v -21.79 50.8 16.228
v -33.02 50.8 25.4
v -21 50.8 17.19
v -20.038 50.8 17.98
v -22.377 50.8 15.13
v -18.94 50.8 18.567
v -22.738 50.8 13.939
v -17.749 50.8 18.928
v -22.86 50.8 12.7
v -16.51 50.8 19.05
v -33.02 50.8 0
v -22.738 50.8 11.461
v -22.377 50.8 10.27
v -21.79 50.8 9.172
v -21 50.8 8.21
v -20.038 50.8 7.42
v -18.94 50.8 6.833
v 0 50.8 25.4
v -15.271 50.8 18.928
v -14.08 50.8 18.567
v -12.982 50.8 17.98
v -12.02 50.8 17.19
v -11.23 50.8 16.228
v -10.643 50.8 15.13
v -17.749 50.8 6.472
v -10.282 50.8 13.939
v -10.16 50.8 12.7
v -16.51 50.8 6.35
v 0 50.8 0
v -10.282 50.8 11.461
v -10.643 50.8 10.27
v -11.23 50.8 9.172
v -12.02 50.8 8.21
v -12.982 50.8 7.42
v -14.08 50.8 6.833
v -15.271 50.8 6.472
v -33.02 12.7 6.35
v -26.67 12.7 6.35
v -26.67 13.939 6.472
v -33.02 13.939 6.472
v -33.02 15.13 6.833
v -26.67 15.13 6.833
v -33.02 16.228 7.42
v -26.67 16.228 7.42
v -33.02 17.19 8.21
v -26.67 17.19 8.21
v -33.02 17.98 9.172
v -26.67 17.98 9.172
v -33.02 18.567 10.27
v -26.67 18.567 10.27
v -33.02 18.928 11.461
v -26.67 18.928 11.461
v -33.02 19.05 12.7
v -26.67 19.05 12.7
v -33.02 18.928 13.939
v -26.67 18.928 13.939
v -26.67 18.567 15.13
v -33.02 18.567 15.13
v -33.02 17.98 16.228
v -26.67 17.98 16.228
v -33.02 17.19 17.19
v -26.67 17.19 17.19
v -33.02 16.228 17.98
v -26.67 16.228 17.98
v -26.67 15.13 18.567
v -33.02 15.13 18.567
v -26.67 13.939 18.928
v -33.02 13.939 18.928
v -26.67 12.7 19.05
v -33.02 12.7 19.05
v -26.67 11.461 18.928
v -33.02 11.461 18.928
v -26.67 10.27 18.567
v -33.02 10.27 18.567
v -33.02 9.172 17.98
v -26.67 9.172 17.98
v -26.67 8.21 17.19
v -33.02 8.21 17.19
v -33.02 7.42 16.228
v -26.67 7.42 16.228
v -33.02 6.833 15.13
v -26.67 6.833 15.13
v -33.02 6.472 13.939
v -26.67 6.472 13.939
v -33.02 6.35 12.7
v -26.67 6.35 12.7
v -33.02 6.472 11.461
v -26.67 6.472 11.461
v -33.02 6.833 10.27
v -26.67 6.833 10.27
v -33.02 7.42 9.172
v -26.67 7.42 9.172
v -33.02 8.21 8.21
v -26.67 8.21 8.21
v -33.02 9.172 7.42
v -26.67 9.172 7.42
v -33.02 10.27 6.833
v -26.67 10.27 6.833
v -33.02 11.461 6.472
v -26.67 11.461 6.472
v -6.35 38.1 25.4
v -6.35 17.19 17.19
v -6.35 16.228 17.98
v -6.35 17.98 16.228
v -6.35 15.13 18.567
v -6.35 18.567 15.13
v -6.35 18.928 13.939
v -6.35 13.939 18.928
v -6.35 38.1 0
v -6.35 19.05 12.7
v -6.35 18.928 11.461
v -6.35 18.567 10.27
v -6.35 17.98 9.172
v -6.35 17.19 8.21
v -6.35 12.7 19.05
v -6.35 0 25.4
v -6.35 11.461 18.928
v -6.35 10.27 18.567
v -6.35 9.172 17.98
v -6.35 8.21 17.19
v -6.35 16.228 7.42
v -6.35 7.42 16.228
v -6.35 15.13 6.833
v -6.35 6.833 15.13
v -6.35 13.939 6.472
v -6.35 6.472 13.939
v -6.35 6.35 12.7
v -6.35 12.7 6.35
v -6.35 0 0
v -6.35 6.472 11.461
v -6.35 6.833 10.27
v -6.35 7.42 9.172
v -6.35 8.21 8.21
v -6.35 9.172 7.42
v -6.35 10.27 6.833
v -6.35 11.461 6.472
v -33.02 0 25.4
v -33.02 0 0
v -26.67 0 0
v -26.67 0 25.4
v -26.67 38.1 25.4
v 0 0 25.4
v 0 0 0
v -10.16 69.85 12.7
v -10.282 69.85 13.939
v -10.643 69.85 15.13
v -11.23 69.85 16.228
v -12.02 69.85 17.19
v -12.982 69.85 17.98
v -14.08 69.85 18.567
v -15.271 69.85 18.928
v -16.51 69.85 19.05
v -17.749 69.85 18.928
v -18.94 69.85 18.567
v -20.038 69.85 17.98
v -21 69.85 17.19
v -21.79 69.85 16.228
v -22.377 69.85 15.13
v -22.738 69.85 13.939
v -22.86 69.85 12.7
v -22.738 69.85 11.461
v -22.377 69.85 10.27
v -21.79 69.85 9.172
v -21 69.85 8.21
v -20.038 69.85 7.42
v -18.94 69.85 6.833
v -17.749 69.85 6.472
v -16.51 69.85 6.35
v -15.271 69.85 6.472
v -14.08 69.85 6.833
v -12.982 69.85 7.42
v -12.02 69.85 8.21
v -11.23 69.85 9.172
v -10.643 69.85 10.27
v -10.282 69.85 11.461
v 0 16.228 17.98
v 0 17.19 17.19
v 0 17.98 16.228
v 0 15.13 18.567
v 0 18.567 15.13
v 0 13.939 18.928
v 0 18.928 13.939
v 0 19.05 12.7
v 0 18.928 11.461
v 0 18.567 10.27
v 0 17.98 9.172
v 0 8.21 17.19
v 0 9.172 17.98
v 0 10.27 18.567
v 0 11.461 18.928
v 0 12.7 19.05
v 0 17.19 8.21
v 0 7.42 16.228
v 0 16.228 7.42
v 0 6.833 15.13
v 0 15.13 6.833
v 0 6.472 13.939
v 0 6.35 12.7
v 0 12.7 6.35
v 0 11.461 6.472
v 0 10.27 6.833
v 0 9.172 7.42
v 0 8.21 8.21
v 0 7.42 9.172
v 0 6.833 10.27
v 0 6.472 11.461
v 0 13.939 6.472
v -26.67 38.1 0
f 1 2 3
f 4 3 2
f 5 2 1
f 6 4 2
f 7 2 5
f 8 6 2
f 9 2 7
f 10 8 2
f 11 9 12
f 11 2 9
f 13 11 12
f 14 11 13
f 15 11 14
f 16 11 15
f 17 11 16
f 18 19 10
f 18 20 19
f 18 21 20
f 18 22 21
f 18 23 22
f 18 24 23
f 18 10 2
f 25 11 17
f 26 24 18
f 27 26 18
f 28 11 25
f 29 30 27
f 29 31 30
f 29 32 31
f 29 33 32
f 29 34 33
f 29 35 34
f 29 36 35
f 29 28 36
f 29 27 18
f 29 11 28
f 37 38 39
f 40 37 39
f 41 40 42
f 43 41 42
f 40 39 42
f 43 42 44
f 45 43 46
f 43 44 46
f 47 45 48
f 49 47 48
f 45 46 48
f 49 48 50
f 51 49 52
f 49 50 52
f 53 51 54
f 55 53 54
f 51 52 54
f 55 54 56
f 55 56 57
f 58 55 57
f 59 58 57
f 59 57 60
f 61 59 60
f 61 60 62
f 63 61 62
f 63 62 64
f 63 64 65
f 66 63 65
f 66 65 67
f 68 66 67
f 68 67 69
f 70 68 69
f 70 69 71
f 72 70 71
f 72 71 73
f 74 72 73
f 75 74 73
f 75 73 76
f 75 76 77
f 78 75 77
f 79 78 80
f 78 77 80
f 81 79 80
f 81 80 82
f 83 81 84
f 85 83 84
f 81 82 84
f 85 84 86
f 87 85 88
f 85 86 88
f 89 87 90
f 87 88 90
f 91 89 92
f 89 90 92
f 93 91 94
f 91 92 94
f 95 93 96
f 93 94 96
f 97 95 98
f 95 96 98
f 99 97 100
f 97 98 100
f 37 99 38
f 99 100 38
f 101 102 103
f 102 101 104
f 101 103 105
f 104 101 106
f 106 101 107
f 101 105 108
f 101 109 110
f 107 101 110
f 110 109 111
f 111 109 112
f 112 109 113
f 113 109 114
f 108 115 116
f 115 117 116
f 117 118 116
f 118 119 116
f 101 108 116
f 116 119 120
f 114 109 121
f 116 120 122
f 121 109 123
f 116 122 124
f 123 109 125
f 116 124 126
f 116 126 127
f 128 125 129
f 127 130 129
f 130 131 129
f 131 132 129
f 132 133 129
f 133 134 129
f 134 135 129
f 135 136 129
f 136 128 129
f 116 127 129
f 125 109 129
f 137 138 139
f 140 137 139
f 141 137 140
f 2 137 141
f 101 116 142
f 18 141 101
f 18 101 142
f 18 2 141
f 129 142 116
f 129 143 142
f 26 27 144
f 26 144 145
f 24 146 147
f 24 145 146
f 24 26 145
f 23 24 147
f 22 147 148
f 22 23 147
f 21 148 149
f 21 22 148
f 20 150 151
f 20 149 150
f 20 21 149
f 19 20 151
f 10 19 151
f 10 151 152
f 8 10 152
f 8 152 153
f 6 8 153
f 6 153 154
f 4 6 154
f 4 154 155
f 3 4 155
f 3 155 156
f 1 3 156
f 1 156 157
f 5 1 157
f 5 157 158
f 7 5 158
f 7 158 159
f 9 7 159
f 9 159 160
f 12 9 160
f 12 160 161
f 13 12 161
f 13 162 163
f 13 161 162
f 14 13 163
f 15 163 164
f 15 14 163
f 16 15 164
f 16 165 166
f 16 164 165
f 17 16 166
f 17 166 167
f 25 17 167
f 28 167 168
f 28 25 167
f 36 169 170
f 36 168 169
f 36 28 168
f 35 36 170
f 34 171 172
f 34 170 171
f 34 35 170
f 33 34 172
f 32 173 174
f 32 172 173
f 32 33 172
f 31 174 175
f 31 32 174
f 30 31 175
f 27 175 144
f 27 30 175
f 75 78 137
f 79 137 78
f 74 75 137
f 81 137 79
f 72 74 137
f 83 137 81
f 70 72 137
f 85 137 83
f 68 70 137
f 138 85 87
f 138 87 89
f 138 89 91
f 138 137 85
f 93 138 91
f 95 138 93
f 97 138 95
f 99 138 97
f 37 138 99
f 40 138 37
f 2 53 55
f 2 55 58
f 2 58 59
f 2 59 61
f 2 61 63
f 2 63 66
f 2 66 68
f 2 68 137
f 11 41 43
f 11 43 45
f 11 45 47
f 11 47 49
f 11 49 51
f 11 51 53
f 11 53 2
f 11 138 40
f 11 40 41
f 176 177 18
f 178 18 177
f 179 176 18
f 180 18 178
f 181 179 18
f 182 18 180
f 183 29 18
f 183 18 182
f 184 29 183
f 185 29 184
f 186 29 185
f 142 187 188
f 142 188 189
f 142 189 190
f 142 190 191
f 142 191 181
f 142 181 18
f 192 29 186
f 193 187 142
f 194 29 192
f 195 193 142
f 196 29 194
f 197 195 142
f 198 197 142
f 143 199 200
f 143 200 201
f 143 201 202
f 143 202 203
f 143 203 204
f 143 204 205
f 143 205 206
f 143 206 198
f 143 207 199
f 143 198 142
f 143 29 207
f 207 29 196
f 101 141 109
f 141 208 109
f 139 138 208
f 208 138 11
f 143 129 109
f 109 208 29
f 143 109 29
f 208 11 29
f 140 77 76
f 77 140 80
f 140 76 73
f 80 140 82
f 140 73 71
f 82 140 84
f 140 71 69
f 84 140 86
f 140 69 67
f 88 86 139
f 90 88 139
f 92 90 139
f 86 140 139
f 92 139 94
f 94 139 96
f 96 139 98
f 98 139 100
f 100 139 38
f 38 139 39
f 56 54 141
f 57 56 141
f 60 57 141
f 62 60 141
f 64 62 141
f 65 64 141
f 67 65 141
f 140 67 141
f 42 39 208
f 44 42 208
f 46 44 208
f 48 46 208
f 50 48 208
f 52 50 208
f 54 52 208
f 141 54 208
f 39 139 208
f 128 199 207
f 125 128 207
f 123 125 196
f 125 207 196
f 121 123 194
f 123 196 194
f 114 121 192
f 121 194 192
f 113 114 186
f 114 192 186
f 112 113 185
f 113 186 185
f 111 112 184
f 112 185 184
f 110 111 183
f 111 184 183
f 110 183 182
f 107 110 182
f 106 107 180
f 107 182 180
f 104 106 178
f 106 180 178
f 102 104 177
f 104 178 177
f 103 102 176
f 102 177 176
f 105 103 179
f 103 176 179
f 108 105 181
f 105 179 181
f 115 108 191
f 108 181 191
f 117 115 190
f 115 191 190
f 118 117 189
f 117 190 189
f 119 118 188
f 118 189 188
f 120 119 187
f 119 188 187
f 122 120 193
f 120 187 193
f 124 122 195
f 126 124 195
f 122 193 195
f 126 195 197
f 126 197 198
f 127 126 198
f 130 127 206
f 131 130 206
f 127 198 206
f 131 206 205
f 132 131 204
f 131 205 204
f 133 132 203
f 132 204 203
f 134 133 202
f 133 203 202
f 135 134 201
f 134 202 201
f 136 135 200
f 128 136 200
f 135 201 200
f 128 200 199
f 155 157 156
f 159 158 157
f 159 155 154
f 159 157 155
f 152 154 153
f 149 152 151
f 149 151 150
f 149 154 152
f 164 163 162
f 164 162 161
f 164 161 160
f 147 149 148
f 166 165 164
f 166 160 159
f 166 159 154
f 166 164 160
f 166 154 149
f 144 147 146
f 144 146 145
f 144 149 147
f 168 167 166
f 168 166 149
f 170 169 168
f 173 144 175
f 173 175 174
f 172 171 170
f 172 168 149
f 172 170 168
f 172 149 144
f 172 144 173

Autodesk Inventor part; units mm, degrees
ref_plane "YZ Plane" through (0, 0, 0) normal (1, 0, 0) x (0, 1, 0)
ref_plane "XZ Plane" through (0, 0, 0) normal (0, 1, 0) x (-1, 0, 0)
ref_plane "XY Plane" through (0, 0, 0) normal (0, 0, 1) x (1, 0, 0)
sketch "Sketch1" plane through (0, 0, 0) normal (0, 0, 1) x (1, 0, 0)
  line L0 (-33.02, 0) -> (-33.02, 50.8)
  line L1 (-33.02, 50.8) -> (0, 50.8)
  line L2 (0, 50.8) -> (0, 0)
  line L3 (-33.02, 0) -> (-26.67, 0)
  line L4 (-26.67, 0) -> (-26.67, 38.1)
  line L5 (-33.02, 50.8) -> (-33.02, 44.45)
  line L6 (-26.67, 38.1) -> (-6.35, 38.1)
  line L7 (0, 50.8) -> (-6.35, 50.8)
  line L8 (-6.35, 38.1) -> (-6.35, 0)
  line L9 (0, 0) -> (-6.35, 0)
  line L10 (-26.67, 0) -> (-33.02, 0)
  dimension "d0" = 33.02
  dimension "d1" = 50.8
  dimension "d2" = 6.35
  dimension "d3" = 6.35
  dimension "d4" = 6.35
  dimension "d11" = 50.8
  dimension "d15" = 38.1
extrude "Extrusion1" add sketch "Sketch1" along normal blind 25.4
sketch "Sketch2" plane through (0, 0, 0) normal (1, 0, 0) x (0, 0, -1)
  line L0 (0, 0) -> (-25.4, 0) projected
  line L1 (0, 50.8) -> (-25.4, 50.8) projected
  line L2 (-12.7, 0) -> (-12.7, 12.7)
  circle A0 centre (-12.7, 12.7) radius 6.35
  dimension "d7" = 12.7
  dimension "d8" = 12.7
extrude "Extrusion2" cut sketch "Sketch2" against normal blind 254
sketch "Sketch3" plane through (-33.02, 50.8, 0) normal (0, 1, 0) x (1, 0, 0)
  circle A0 centre (16.51, -12.7) radius 6.35
  dimension "d12" = 12.7
extrude "Extrusion3" add sketch "Sketch3" along normal blind 19.05
properties part number "small wheel support"
